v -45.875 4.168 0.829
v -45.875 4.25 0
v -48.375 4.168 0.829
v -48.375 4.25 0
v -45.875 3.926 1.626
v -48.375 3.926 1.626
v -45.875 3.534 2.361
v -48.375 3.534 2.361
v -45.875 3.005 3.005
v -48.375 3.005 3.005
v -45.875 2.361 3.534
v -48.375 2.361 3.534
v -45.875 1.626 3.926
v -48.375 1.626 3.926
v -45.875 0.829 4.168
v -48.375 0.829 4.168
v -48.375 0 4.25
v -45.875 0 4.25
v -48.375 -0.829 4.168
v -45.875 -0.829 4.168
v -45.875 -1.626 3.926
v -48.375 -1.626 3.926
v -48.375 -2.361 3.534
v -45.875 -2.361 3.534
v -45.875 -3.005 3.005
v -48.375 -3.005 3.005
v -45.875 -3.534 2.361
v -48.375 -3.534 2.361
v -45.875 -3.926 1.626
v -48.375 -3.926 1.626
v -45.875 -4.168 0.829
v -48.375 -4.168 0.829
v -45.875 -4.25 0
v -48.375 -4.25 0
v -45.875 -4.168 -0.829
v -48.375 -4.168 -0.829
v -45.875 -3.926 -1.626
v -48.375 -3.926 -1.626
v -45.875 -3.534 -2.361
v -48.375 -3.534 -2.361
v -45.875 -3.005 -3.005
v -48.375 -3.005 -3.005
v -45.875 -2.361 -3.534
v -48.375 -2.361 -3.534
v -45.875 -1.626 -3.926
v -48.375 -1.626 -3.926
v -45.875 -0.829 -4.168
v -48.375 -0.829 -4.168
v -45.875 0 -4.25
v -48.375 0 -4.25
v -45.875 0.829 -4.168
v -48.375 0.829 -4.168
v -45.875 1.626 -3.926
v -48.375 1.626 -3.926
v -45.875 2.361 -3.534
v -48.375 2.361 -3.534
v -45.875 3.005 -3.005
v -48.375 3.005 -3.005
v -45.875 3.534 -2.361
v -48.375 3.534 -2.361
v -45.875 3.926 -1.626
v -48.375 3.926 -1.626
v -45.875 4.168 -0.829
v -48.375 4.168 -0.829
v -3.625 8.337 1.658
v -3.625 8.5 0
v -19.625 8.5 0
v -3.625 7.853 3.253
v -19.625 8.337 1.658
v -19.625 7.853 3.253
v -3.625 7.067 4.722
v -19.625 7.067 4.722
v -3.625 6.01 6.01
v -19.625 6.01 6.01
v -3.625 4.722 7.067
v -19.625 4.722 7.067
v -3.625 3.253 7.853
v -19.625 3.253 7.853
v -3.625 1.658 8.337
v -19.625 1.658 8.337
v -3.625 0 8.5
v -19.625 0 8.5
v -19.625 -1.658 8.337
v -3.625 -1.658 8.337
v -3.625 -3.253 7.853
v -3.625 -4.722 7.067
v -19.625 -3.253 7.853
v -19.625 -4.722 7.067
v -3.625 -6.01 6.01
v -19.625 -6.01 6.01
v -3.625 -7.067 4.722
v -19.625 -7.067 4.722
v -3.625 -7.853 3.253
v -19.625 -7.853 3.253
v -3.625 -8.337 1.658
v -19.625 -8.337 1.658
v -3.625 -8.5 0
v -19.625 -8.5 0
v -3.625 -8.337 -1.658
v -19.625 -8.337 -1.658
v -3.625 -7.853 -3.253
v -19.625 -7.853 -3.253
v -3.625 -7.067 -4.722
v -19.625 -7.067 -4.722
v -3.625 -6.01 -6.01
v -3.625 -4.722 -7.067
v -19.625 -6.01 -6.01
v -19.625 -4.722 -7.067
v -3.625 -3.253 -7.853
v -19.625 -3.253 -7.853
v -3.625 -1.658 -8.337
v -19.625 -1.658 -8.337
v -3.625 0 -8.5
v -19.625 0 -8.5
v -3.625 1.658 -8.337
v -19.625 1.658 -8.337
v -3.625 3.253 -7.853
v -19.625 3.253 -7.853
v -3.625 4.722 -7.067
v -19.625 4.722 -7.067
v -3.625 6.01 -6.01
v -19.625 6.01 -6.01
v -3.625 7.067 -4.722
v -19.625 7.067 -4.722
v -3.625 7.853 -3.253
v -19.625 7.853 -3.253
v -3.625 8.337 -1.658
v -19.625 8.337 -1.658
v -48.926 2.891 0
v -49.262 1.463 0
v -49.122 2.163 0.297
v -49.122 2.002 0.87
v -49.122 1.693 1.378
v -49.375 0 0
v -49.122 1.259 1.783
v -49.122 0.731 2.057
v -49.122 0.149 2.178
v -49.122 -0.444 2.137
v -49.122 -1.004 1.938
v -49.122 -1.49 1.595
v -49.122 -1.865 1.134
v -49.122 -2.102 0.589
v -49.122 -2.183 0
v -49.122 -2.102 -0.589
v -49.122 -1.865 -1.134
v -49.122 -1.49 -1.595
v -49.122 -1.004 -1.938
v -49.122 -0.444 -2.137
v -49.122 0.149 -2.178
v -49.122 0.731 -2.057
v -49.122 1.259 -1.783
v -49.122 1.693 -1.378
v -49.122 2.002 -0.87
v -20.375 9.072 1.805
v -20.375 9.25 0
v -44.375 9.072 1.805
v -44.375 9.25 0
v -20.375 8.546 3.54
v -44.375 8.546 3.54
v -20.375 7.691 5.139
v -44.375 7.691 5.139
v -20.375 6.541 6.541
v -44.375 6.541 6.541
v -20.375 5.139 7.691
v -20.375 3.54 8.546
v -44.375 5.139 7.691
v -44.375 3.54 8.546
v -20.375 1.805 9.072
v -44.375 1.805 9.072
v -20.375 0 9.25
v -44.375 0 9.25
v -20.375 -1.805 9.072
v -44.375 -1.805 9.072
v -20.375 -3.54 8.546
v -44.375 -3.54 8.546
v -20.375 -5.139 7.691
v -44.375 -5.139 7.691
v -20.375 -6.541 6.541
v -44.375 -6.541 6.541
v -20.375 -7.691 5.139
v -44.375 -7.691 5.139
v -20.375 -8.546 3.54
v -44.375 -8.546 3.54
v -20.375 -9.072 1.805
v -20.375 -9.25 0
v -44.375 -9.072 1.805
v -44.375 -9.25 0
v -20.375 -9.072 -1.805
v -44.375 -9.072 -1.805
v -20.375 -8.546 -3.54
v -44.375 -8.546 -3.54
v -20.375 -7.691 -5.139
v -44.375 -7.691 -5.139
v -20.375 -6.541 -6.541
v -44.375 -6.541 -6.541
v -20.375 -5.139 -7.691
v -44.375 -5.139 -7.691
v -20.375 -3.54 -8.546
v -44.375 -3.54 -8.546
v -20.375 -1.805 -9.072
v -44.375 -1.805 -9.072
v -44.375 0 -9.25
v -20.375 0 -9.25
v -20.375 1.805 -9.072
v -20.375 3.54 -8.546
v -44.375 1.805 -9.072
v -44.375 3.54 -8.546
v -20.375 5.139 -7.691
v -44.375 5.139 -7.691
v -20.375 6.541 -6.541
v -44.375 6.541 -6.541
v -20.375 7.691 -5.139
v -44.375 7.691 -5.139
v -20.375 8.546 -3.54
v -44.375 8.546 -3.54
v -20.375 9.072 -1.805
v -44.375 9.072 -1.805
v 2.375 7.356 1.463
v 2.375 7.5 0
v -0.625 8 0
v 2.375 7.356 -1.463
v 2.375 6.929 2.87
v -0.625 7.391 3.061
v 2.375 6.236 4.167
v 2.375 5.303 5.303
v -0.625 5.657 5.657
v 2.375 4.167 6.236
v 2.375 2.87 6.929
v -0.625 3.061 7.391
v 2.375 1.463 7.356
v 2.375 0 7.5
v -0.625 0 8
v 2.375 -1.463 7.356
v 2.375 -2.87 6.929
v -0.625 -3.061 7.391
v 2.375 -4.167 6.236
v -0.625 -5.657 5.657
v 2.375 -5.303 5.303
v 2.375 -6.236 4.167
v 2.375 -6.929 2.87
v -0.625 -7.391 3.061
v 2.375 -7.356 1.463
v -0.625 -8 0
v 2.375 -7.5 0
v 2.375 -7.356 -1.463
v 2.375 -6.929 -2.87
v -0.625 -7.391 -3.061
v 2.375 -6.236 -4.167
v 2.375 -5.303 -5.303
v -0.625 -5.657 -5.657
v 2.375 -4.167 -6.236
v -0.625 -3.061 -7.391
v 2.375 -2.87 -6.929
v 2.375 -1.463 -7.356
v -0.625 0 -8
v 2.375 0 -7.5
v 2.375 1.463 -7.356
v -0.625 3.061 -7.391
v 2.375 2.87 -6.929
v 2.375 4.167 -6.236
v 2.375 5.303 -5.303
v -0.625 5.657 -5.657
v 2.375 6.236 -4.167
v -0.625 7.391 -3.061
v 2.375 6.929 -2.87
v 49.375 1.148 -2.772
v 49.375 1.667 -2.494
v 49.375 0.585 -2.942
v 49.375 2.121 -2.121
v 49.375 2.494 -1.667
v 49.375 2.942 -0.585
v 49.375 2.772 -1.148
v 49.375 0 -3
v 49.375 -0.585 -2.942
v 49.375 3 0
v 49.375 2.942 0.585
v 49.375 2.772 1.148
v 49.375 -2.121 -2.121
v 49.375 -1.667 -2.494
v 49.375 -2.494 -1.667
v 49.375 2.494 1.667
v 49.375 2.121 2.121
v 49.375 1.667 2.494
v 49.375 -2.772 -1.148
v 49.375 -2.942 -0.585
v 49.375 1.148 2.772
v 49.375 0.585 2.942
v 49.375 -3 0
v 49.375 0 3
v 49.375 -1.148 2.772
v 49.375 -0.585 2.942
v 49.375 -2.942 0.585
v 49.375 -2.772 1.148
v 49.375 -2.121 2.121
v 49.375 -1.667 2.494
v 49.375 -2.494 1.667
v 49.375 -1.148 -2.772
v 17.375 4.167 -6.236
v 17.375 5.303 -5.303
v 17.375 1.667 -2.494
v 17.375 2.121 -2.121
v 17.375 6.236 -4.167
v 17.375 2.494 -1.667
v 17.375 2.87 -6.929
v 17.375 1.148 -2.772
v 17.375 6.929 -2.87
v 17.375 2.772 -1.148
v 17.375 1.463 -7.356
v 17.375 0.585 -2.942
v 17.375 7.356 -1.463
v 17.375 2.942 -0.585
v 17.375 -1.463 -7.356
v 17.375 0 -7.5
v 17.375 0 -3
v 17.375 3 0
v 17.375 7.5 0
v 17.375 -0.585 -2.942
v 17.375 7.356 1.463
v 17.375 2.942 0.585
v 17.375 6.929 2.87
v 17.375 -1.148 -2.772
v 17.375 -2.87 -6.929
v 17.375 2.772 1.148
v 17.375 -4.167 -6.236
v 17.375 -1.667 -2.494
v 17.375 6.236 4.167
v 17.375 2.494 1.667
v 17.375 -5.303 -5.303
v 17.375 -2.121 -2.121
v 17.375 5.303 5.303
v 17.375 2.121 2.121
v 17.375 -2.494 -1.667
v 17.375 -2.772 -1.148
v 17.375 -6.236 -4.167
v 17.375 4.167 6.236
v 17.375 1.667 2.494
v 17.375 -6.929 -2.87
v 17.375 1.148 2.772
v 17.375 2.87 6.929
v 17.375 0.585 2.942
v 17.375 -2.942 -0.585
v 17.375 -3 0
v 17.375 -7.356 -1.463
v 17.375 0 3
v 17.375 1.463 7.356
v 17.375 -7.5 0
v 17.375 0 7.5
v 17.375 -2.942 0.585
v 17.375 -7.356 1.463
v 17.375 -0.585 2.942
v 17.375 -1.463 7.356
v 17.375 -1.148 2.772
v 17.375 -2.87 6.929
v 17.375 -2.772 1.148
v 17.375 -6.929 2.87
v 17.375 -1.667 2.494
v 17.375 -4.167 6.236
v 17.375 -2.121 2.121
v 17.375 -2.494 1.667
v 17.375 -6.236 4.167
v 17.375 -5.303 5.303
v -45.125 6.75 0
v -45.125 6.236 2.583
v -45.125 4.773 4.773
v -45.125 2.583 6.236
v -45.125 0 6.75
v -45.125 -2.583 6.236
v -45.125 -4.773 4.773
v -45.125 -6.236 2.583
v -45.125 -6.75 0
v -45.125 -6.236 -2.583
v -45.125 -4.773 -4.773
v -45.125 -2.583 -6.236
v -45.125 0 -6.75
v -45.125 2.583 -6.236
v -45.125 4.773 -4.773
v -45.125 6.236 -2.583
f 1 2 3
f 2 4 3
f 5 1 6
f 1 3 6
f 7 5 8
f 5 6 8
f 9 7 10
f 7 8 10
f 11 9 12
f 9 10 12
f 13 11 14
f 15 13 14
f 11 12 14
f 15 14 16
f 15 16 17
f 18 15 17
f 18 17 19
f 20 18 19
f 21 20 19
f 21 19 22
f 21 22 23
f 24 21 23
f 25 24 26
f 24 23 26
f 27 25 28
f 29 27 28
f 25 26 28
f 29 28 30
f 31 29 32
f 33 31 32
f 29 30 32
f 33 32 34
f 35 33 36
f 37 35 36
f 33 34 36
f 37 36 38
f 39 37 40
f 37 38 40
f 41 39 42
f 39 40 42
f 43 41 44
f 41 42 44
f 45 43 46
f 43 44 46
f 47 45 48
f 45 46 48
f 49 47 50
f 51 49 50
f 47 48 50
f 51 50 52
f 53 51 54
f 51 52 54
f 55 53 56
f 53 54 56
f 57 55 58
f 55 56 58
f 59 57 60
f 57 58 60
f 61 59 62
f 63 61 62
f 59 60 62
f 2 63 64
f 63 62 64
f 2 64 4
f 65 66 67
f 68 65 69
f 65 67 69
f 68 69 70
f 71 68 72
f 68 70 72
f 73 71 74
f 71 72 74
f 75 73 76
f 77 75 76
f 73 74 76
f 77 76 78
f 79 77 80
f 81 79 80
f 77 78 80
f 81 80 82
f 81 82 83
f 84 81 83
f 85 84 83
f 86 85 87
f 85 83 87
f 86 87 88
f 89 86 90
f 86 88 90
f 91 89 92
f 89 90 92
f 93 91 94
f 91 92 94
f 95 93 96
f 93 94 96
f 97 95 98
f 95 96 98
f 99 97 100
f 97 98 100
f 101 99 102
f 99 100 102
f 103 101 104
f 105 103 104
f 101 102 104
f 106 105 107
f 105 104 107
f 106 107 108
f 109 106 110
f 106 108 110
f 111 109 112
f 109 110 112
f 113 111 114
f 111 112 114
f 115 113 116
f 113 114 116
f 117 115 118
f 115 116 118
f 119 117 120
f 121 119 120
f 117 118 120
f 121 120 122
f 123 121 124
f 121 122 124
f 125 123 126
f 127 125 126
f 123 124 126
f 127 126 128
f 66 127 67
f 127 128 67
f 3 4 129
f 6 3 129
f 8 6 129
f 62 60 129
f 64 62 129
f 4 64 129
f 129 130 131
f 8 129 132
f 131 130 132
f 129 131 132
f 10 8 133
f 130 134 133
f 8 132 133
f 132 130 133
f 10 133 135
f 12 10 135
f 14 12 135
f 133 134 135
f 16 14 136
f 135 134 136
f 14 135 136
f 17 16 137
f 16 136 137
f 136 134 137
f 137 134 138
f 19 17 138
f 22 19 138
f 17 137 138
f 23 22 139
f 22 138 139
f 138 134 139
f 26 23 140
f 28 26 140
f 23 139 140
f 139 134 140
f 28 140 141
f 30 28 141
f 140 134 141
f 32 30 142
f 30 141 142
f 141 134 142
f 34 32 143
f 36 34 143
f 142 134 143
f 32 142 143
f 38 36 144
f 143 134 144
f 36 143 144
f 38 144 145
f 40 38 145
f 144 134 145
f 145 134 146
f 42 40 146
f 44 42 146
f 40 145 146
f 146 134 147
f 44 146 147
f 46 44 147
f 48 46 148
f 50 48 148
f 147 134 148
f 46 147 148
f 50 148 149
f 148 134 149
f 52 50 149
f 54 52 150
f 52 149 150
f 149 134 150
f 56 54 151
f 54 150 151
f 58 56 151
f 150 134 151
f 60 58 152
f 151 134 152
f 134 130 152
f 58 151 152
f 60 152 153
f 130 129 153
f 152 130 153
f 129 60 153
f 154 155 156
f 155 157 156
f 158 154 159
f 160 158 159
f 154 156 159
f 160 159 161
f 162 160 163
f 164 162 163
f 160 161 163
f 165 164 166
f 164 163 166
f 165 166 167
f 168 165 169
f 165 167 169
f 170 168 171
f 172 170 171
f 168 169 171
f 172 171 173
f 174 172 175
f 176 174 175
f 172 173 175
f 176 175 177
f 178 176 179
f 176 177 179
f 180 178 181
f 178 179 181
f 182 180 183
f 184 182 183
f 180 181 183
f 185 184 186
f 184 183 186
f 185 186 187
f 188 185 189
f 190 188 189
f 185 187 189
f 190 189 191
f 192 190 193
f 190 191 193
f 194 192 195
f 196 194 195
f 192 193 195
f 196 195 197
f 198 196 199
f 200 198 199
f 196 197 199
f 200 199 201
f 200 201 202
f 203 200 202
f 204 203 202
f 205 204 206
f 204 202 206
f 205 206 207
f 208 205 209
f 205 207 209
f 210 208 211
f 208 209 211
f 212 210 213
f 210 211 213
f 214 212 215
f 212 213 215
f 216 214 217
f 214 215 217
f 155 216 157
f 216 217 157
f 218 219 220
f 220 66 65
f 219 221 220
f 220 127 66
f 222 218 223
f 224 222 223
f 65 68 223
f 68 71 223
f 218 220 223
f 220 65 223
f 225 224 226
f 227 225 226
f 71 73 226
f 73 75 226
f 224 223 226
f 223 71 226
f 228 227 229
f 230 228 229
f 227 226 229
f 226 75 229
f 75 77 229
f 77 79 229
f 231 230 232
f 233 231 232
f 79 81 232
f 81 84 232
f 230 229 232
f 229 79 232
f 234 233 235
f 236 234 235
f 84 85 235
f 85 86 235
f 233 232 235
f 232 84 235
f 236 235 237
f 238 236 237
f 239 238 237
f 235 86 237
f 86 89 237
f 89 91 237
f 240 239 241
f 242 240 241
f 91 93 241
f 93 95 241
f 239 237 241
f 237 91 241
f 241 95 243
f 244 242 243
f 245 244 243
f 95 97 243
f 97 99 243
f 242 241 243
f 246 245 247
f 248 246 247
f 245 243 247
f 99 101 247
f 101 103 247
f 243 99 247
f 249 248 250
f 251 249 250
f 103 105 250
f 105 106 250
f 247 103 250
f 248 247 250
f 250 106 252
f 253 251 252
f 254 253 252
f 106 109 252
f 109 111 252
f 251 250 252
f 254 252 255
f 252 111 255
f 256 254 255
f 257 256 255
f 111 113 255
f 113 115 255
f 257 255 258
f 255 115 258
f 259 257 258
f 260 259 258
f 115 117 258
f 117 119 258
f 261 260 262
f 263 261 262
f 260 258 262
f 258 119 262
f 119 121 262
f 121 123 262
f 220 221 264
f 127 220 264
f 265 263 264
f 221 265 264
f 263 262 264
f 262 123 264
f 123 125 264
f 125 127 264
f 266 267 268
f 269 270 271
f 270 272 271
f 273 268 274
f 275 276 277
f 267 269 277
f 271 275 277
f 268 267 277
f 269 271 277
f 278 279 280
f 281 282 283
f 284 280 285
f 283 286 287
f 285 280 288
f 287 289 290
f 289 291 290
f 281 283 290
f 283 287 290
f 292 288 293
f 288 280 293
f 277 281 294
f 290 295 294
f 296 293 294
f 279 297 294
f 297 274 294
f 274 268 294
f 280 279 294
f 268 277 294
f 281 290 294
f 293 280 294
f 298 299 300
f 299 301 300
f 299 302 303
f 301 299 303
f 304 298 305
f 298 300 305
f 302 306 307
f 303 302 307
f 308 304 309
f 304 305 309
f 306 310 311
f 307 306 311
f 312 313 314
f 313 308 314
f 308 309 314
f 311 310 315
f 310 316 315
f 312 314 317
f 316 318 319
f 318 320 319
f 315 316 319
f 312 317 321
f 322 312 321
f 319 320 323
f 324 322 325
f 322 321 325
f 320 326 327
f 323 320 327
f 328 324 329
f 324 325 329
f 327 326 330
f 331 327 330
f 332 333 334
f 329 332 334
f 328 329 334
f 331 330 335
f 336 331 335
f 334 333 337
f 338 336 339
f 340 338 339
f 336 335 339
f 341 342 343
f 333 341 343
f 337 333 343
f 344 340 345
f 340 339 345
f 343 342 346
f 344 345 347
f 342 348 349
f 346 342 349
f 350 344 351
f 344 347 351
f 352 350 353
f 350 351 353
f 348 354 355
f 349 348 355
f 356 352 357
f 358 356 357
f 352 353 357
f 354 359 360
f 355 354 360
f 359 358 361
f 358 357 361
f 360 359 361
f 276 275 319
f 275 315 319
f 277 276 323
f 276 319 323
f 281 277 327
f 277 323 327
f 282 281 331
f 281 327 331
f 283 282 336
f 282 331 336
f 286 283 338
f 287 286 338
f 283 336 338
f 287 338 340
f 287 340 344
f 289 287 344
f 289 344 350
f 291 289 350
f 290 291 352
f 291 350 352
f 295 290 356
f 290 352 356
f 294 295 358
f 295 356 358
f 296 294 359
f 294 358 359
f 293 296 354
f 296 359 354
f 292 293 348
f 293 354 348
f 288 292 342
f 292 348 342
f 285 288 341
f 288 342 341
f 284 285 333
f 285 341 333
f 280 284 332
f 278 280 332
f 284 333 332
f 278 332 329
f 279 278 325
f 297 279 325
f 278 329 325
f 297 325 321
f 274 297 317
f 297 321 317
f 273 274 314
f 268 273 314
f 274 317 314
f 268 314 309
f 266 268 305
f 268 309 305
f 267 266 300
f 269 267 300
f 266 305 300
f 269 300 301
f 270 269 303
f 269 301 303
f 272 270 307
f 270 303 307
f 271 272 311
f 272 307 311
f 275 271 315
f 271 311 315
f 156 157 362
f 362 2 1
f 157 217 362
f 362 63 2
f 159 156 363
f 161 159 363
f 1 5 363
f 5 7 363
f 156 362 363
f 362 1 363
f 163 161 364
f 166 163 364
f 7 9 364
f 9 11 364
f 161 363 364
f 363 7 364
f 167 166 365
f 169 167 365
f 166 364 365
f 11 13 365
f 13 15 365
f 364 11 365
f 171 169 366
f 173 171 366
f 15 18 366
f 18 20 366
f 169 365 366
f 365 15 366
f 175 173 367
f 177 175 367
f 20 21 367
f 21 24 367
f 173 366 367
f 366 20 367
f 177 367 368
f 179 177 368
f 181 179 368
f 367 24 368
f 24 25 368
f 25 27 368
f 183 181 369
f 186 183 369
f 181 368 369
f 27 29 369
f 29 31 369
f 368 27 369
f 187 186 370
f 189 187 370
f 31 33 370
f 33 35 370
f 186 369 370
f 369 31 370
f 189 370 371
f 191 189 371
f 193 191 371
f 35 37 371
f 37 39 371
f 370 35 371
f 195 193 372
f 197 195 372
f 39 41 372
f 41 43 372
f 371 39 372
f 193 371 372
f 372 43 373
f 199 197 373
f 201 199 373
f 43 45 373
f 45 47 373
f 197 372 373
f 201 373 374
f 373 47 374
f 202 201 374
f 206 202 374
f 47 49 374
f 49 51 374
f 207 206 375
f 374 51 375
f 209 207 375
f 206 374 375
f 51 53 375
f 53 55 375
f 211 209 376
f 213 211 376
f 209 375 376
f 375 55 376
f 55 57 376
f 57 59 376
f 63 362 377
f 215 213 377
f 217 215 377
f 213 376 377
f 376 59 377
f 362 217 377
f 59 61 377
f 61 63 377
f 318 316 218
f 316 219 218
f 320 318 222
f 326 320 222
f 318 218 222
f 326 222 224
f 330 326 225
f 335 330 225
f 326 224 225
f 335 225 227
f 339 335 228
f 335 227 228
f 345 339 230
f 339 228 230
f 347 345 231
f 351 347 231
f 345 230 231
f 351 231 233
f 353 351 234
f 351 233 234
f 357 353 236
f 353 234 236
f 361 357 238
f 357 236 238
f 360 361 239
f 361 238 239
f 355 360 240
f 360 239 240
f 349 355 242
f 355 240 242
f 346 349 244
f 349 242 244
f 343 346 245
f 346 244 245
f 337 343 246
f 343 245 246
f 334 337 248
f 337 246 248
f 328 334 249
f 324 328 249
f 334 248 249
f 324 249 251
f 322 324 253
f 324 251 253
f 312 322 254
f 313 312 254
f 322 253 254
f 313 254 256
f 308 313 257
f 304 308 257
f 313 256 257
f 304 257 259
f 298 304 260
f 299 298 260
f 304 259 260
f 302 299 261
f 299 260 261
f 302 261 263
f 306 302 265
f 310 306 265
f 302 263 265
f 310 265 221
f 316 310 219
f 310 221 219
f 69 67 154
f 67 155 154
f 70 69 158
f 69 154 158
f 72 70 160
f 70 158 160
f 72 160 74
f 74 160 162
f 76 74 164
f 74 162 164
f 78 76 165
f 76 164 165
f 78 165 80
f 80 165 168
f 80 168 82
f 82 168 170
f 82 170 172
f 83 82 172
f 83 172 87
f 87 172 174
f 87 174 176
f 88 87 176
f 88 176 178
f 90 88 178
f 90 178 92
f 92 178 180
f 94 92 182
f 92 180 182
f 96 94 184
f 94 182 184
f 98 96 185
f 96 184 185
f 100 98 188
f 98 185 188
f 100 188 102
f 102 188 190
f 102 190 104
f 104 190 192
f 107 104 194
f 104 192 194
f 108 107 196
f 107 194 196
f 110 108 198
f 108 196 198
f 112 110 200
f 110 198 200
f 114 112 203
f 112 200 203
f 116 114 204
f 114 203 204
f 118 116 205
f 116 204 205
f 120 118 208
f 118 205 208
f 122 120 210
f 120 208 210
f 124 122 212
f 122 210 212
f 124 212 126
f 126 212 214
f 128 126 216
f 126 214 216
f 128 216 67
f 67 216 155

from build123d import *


with BuildPart() as part:
    # Sketch1 → Revolve1 (revolve)
    with BuildSketch(Plane.XY):
        with BuildLine():
            Line((-49.375, 0), (49.375, 0))
            Line((49.375, 0), (49.375, 3))
            Line((49.375, 3), (17.375, 3))
            Line((17.375, 3), (17.375, 7.5))
            Line((17.375, 7.5), (2.375, 7.5))
            Line((2.375, 7.5), (-3.625, 8.5))
            Line((-3.625, 8.5), (-19.625, 8.5))
            Line((-19.625, 8.5), (-20.375, 9.25))
            Line((-20.375, 9.25), (-44.375, 9.25))
            Line((-44.375, 9.25), (-45.875, 4.25))
            Line((-45.875, 4.25), (-48.375, 4.25))
            ThreePointArc((-48.375, 4.25), (-49.121632386, 2.18303115), (-49.375, 0))
        make_face()
    revolve(axis=Axis((0, 0, 0), (1, 0, 0)))


solid = part.part
